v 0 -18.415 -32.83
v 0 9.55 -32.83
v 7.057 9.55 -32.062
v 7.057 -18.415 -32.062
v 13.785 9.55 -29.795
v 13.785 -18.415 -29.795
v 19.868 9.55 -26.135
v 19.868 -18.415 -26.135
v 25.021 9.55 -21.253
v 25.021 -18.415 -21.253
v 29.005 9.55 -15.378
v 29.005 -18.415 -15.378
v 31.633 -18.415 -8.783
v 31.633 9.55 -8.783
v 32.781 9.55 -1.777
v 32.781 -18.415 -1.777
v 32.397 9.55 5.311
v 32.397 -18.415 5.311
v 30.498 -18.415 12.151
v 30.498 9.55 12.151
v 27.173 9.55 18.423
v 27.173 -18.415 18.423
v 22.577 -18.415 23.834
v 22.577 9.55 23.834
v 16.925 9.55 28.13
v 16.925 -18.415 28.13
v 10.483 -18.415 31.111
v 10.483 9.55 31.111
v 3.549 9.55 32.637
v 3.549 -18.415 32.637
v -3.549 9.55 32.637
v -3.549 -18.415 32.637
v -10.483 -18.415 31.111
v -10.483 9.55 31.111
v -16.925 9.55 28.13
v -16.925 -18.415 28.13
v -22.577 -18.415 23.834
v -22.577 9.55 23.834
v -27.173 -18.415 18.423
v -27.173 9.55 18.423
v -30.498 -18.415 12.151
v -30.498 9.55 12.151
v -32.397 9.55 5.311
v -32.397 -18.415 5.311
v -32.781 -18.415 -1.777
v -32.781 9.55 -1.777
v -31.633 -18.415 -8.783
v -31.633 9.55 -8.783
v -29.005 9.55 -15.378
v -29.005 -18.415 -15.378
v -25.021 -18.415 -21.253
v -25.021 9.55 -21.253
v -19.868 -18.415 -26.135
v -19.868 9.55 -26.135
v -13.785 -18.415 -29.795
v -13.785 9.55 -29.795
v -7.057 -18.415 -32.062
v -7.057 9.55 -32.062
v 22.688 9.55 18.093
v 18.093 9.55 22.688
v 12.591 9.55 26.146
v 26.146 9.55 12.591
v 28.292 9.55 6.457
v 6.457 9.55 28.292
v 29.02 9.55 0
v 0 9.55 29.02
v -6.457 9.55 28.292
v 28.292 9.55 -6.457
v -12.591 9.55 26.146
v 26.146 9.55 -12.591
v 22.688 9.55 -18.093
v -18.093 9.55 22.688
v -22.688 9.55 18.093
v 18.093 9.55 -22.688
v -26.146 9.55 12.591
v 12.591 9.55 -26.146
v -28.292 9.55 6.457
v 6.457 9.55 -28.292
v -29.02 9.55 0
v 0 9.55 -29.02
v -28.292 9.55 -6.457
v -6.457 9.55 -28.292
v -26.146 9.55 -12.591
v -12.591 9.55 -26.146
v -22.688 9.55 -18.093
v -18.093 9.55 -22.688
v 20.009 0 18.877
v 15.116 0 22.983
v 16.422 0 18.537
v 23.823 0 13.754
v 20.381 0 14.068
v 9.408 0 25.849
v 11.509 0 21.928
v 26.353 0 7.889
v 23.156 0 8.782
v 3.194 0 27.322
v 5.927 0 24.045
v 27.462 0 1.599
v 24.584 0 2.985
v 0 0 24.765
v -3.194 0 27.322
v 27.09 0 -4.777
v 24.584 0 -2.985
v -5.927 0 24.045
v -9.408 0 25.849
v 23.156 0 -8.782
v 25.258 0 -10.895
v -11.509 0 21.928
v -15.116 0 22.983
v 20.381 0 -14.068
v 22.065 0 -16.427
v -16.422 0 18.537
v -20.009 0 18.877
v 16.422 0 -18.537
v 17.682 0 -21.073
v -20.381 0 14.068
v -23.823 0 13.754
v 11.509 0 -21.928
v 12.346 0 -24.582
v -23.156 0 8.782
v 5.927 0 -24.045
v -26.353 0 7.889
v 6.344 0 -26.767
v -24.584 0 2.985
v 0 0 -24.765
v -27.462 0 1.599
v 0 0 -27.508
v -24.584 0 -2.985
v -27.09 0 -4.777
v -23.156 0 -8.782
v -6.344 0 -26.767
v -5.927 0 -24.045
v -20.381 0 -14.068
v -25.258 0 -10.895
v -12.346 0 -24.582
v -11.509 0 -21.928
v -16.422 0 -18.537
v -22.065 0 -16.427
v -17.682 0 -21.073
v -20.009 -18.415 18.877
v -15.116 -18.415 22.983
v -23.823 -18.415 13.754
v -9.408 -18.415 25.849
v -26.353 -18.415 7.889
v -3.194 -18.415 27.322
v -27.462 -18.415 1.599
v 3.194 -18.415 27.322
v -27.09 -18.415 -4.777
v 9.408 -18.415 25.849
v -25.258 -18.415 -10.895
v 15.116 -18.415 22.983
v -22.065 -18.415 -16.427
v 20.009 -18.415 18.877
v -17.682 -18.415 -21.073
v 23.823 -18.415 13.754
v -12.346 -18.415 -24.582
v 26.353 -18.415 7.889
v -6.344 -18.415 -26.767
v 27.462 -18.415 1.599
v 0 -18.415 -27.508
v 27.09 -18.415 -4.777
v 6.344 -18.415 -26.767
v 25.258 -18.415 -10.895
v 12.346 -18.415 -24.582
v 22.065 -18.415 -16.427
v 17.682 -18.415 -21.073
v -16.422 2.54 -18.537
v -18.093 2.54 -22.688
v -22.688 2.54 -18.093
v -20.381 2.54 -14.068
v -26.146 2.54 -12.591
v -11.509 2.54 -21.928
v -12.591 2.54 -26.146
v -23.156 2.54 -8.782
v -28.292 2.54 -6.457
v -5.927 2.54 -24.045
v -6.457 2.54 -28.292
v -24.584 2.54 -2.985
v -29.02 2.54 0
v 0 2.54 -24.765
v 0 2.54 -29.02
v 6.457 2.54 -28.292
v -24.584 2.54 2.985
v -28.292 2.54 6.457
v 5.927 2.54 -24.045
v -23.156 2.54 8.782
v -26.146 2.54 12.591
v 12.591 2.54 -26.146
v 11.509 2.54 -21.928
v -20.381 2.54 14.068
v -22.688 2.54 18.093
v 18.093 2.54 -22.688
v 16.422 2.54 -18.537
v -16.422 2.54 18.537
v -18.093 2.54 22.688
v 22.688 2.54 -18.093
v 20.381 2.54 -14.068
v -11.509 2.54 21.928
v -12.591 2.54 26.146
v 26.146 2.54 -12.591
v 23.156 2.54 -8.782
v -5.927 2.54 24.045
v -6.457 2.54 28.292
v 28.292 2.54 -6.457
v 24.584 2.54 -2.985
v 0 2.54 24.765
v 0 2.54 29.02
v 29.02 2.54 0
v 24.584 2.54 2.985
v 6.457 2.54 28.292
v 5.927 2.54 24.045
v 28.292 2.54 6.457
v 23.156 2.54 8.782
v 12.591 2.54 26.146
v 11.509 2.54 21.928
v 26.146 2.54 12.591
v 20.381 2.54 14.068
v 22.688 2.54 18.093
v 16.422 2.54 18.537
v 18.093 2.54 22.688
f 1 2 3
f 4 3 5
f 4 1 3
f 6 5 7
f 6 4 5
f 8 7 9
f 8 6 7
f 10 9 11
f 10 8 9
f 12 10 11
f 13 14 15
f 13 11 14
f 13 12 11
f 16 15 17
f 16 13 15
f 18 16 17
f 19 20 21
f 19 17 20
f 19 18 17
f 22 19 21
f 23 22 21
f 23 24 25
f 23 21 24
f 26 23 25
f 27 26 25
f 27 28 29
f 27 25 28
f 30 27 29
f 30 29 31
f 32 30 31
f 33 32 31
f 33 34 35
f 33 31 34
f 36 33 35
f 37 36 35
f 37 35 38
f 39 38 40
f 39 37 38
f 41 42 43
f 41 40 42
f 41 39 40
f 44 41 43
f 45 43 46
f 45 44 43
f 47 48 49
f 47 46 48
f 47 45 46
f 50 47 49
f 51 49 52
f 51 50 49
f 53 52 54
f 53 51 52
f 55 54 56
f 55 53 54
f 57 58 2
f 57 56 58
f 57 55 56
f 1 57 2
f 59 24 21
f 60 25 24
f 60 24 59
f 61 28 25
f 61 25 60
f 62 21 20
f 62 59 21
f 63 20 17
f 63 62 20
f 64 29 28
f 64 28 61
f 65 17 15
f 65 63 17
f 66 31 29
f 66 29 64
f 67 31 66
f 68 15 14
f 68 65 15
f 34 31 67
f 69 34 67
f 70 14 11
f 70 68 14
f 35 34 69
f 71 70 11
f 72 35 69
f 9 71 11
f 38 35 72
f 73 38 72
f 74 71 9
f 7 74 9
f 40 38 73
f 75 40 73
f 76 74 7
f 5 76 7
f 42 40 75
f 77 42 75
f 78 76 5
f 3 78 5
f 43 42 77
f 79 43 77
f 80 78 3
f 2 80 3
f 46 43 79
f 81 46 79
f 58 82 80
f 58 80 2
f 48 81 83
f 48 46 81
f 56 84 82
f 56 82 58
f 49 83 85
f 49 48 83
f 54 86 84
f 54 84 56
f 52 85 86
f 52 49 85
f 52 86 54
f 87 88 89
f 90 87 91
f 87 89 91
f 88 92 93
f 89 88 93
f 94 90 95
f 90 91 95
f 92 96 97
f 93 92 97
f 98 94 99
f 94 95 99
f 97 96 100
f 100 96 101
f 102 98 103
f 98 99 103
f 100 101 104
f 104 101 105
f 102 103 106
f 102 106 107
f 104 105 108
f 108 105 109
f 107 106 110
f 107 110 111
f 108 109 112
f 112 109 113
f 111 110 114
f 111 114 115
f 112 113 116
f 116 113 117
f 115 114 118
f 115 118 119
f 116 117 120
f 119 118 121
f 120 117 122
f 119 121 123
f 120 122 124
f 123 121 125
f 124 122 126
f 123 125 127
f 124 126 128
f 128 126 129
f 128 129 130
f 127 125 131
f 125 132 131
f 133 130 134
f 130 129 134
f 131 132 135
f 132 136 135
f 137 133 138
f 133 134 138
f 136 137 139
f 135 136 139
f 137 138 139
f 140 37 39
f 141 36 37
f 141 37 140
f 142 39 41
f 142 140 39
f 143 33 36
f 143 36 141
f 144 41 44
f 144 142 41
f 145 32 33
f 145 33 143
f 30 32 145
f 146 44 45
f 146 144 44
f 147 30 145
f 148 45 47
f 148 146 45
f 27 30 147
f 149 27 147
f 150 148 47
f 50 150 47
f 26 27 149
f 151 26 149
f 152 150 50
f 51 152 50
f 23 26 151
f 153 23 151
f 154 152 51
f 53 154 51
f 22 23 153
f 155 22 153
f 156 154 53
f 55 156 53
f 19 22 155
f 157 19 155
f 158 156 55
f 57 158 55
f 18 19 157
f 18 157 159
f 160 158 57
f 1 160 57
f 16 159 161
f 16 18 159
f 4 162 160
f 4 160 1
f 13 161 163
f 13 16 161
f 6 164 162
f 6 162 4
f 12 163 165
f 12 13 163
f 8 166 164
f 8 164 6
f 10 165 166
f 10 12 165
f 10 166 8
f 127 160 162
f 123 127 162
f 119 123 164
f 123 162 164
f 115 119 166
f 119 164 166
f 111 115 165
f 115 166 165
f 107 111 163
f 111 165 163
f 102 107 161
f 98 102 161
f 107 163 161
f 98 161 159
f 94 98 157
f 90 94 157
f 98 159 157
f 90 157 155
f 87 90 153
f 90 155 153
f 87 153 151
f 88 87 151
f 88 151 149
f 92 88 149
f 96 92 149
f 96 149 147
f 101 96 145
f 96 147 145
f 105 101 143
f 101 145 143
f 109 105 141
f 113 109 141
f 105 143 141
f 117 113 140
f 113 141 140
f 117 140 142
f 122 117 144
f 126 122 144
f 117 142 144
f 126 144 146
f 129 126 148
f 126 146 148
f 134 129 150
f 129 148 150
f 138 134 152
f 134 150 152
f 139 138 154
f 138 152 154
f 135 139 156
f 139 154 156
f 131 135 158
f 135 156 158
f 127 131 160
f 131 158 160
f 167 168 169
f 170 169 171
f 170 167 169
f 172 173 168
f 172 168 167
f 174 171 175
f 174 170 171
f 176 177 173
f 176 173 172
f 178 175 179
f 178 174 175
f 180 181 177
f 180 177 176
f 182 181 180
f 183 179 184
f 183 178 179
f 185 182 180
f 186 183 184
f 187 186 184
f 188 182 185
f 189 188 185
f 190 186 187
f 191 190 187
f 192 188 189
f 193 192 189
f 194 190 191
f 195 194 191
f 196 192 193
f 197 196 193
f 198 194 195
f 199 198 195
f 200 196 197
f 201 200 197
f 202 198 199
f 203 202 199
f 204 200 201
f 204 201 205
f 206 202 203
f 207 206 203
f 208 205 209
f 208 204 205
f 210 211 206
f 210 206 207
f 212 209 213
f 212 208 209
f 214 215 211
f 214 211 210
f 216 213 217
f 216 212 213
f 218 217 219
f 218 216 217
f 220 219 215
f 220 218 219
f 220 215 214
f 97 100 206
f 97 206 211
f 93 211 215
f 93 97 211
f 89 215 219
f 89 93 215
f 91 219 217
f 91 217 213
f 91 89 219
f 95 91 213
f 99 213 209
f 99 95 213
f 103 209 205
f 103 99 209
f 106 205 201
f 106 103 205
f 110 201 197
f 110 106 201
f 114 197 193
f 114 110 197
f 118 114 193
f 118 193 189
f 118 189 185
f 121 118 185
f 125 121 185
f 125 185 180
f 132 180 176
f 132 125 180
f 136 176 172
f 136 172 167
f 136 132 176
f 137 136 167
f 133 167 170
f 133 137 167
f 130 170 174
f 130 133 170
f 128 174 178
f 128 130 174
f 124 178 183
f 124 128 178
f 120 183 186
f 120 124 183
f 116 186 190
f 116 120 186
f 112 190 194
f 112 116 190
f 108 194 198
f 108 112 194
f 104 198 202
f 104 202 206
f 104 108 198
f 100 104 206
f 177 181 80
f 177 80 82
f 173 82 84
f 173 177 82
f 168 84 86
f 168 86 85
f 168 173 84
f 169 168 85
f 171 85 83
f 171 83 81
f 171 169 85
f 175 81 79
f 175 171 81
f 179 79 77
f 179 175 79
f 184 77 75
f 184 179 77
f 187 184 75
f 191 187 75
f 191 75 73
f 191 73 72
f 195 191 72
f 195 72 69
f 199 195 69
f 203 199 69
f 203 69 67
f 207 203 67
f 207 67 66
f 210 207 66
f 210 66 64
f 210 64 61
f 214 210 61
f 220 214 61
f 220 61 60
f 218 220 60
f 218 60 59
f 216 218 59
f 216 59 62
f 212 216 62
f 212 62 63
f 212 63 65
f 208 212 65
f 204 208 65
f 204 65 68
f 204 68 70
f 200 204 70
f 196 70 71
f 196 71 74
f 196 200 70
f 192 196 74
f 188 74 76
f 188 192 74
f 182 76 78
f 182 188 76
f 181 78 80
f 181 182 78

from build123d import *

# Parameters (mm, degrees)
SKETCH3_R           = 29.0195
SKETCH3_R_2         = 24.765
BOSS_EXTRUDE2_DEPTH = 2.54
SKETCH4_R           = 32.8295
SKETCH4_R_2         = 29.0195
BOSS_EXTRUDE3_DEPTH = 9.5504
BOSS_EXTRUDE4_START = 18.415
SKETCH5_R           = 32.8295
SKETCH5_R_2         = 27.5082
BOSS_EXTRUDE4_DEPTH = 18.415


with BuildPart() as part:
    # Sketch3 → Boss-Extrude2 (new body)
    with BuildSketch(Plane(origin=(0, 0, 0), x_dir=(1, 0, 0), z_dir=(0, 1, 0))):
        with Locations(Location((0, 0, 0), (0, 0, 270))):
            Circle(SKETCH3_R)
        with Locations(Location((0, 0, 0), (0, 0, 270))):
            Circle(SKETCH3_R_2, mode=Mode.SUBTRACT)
    extrude(amount=BOSS_EXTRUDE2_DEPTH)

    # Sketch4 → Boss-Extrude3 (add)
    with BuildSketch(Plane(origin=(0, 0, 0), x_dir=(1, 0, 0), z_dir=(0, 1, 0))):
        with Locations(Location((0, 0, 0), (0, 0, 90))):
            Circle(SKETCH4_R)
        with Locations(Location((0, 0, 0), (0, 0, 90))):
            Circle(SKETCH4_R_2, mode=Mode.SUBTRACT)
    extrude(amount=BOSS_EXTRUDE3_DEPTH)

    # Sketch5 → Boss-Extrude4 (add)
    with BuildSketch(Plane.XZ.offset(BOSS_EXTRUDE4_START)):
        with Locations(Location((0, 0, 0), (0, 0, 270))):
            Circle(SKETCH5_R)
        with Locations(Location((0, 0, 0), (0, 0, 270))):
            Circle(SKETCH5_R_2, mode=Mode.SUBTRACT)
    extrude(amount=-BOSS_EXTRUDE4_DEPTH)


solid = part.part
